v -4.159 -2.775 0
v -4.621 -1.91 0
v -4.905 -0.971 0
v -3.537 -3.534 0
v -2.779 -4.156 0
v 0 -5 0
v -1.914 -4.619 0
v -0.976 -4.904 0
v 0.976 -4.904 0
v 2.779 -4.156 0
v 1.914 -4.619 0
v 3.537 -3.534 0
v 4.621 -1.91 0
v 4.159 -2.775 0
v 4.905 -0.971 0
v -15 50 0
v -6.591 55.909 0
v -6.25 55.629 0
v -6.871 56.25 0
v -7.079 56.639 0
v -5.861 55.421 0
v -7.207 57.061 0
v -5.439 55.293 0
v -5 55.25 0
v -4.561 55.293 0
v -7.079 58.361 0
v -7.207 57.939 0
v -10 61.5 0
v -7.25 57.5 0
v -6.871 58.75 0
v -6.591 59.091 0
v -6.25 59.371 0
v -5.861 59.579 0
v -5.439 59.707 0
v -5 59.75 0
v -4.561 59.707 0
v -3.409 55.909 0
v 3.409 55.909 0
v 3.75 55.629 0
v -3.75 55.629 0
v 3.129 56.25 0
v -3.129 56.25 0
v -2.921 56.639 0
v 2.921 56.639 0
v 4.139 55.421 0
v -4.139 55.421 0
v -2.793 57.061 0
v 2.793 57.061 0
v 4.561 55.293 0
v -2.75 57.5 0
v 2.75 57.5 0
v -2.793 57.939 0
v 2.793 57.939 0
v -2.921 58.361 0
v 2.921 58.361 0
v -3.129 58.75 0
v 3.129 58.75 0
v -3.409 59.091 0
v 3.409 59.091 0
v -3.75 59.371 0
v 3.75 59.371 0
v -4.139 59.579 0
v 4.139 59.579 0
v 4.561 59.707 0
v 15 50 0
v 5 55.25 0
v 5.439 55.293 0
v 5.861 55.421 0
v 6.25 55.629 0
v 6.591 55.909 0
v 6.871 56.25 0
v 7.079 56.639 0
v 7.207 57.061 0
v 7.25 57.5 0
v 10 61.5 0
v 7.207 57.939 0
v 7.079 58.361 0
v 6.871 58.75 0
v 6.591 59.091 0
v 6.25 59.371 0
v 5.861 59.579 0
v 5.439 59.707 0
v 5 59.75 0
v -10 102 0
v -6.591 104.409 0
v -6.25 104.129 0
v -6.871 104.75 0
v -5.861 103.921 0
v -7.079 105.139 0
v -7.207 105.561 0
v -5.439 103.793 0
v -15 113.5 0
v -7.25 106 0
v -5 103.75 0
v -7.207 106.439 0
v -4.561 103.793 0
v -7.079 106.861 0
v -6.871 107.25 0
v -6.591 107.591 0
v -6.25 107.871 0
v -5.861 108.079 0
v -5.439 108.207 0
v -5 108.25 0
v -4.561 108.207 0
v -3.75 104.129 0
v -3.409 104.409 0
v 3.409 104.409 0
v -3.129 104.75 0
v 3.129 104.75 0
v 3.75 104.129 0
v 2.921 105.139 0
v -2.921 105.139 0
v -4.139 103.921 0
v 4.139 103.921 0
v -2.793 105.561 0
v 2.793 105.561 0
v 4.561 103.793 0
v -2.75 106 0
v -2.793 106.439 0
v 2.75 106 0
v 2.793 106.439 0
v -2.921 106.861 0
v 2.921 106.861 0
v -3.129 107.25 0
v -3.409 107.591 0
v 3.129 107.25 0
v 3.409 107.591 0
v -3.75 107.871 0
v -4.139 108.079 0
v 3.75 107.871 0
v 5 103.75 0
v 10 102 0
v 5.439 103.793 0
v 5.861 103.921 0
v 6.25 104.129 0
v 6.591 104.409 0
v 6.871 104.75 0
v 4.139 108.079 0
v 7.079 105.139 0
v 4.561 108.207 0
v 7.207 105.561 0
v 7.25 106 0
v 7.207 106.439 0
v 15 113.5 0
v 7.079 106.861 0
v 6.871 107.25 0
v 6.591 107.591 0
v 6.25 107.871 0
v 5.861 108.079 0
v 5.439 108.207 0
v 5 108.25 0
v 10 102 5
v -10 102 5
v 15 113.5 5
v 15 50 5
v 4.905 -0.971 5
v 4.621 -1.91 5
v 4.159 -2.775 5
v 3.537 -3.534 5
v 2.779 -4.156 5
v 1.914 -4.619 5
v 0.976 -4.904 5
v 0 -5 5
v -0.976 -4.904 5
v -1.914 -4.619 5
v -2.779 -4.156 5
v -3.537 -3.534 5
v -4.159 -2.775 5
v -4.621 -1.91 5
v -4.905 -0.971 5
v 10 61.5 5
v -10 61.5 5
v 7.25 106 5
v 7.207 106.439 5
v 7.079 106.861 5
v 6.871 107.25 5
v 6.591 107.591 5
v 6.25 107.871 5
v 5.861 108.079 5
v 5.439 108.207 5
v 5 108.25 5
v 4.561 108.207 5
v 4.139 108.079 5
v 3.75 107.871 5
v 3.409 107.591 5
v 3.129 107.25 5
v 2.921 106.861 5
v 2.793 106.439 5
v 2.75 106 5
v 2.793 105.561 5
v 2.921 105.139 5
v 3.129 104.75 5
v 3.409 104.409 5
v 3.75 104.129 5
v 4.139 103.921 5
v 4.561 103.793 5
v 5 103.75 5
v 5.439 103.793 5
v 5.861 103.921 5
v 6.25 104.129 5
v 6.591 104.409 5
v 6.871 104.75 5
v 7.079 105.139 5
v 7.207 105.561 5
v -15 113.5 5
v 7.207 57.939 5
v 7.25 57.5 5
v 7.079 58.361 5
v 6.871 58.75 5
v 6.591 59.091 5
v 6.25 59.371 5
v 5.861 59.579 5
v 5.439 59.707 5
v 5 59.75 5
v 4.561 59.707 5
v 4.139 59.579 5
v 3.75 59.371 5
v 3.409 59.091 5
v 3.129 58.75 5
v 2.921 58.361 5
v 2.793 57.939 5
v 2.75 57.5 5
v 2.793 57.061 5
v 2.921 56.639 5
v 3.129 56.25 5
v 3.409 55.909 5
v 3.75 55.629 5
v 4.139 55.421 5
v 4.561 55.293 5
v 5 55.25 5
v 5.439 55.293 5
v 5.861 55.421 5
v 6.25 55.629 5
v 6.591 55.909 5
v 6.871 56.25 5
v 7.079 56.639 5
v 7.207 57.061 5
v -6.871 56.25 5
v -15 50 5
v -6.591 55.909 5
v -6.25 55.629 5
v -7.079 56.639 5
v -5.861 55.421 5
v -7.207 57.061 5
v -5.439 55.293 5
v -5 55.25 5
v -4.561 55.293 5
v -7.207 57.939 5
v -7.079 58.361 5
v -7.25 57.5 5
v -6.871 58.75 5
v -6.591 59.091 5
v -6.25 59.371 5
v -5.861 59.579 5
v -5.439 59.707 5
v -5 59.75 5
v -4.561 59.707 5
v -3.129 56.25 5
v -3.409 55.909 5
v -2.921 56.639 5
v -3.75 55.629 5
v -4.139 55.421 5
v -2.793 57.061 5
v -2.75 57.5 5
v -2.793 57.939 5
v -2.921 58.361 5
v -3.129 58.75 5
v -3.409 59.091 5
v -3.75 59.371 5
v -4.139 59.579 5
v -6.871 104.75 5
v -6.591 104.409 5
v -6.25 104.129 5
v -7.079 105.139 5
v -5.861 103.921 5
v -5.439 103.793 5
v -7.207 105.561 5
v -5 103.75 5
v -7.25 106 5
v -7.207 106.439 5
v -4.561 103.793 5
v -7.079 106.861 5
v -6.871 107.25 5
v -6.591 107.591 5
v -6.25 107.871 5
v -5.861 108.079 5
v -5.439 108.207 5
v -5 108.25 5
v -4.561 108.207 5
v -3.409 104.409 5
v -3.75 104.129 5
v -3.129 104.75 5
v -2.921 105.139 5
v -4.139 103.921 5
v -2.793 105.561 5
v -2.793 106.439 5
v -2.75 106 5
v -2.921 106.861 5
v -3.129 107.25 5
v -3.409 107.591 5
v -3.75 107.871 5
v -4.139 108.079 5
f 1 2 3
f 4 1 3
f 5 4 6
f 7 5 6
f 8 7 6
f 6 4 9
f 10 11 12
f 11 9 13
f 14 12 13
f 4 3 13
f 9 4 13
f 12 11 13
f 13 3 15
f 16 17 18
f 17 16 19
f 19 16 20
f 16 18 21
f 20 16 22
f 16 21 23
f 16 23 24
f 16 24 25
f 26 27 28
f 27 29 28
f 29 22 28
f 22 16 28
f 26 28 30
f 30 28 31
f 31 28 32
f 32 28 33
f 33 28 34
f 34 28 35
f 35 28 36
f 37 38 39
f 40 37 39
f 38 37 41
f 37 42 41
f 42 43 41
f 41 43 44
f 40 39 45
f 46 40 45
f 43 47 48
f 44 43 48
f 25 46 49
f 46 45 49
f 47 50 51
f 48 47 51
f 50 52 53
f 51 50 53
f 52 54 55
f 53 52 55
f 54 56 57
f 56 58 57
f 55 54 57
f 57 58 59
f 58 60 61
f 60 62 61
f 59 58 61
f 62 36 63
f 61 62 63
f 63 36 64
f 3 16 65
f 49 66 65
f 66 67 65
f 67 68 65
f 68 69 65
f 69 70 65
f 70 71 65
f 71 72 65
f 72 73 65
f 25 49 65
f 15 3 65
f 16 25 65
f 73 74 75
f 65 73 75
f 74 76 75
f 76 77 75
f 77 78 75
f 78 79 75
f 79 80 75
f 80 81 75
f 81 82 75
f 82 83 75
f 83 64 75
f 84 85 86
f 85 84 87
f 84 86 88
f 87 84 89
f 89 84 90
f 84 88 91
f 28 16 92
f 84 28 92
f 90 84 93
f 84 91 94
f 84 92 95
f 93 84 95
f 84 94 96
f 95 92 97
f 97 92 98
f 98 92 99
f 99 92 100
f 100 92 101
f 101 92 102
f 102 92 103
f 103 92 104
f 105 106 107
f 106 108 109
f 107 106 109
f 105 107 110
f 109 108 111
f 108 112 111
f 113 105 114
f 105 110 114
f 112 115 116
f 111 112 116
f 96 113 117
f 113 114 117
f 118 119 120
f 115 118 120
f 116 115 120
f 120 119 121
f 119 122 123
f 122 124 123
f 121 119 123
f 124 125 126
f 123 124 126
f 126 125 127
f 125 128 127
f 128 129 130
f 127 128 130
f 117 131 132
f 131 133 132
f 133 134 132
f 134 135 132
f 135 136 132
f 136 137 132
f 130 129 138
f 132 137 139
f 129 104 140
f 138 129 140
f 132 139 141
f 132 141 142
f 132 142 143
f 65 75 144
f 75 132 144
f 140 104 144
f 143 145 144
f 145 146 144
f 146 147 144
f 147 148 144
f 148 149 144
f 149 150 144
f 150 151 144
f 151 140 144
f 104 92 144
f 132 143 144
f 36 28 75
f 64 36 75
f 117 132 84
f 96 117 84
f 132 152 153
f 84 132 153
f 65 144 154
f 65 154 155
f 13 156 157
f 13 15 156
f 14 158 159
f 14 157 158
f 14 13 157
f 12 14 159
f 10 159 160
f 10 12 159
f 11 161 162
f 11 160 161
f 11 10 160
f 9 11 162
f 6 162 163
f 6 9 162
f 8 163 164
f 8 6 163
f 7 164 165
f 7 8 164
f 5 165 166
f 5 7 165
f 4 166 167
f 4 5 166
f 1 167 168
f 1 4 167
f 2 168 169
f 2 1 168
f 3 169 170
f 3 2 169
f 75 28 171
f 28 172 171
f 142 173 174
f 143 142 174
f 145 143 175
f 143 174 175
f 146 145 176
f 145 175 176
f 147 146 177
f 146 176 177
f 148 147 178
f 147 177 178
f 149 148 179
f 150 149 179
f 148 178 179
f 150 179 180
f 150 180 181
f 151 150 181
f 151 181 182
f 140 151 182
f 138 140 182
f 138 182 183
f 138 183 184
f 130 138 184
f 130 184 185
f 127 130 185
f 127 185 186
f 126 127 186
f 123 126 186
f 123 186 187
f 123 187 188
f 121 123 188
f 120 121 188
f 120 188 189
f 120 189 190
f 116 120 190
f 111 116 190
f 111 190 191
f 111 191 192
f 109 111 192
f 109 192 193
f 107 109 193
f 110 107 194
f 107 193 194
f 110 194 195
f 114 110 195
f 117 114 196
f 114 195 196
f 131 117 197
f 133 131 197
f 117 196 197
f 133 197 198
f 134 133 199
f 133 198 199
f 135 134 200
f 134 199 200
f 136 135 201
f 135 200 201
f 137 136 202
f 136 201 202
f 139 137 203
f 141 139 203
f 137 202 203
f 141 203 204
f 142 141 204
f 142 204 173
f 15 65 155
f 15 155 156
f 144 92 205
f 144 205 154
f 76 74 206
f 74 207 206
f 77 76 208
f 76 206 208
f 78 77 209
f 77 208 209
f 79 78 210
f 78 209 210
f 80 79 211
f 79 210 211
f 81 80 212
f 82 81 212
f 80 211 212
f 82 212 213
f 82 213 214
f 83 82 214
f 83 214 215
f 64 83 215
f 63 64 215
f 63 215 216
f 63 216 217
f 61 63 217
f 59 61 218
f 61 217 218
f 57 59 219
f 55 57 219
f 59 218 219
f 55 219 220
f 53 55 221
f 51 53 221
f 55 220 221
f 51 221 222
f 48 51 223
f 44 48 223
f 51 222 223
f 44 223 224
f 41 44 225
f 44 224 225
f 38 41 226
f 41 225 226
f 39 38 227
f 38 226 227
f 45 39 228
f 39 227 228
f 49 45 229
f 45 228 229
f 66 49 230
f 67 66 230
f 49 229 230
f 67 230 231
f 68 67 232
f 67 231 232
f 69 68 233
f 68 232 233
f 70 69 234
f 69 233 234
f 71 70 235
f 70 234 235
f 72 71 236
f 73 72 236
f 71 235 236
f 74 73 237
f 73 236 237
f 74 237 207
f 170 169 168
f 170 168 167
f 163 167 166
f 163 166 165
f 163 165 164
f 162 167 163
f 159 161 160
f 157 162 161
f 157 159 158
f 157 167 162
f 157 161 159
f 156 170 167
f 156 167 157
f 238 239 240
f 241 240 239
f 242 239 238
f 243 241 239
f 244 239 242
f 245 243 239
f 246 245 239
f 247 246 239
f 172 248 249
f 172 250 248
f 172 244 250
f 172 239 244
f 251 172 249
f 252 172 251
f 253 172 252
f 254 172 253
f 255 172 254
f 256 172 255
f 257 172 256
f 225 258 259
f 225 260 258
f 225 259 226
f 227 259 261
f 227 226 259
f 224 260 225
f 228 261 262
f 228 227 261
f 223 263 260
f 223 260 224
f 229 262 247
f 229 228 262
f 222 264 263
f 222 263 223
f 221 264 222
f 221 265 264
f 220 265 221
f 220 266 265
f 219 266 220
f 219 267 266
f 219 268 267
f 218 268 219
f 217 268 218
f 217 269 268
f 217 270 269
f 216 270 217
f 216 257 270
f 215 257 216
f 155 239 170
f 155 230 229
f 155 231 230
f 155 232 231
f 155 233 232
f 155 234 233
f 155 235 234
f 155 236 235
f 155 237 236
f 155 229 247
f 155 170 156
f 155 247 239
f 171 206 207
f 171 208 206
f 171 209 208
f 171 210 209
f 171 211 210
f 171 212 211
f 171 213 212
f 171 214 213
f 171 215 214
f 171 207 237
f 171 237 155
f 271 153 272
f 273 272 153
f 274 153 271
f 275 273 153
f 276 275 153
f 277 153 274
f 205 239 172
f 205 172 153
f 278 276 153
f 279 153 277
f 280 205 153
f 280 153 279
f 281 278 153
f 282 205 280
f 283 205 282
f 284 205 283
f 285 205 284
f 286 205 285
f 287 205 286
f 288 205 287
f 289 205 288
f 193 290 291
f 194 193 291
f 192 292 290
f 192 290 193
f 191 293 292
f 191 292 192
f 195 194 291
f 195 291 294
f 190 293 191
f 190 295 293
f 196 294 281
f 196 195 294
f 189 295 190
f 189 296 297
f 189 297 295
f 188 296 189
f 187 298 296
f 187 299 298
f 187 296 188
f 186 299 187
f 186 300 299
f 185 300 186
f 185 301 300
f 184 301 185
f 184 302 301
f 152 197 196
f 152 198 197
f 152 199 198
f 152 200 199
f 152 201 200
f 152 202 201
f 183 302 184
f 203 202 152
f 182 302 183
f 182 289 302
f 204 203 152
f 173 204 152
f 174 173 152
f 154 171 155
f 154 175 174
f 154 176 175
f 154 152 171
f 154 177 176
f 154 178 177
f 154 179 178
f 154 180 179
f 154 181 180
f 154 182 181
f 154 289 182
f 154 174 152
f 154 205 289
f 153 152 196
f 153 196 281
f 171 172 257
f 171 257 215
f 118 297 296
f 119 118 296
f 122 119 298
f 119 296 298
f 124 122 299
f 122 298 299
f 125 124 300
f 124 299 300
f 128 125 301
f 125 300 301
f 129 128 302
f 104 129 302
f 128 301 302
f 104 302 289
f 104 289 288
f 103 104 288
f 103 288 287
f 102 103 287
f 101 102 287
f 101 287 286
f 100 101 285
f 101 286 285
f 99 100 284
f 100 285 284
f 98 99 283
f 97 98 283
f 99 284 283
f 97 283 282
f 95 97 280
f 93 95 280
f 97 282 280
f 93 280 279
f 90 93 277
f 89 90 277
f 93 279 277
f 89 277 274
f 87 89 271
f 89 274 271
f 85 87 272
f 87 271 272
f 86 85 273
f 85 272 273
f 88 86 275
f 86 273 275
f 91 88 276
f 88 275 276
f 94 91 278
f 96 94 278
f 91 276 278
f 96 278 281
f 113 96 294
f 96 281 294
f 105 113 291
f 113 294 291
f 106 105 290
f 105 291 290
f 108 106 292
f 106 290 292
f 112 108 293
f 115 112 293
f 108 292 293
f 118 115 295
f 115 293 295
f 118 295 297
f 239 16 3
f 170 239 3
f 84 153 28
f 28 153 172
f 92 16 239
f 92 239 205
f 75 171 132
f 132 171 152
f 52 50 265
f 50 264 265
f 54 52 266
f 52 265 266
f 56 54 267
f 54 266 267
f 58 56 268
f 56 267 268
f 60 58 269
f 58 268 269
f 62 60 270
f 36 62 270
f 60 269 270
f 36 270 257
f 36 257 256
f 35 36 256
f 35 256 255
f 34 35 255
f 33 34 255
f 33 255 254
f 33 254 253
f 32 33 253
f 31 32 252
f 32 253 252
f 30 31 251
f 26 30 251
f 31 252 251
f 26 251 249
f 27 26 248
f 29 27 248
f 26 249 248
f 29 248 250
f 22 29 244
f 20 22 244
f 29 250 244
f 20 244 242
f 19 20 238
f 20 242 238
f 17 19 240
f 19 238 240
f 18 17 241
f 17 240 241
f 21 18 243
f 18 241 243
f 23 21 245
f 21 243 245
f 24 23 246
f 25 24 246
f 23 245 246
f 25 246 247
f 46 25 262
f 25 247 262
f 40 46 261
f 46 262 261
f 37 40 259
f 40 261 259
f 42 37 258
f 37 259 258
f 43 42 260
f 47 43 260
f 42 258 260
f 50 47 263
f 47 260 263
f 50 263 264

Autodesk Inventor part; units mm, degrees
ref_plane "YZ Plane" through (0, 0, 0) normal (1, 0, 0) x (0, 1, 0)
ref_plane "XZ Plane" through (0, 0, 0) normal (0, 1, 0) x (-1, 0, 0)
ref_plane "XY Plane" through (0, 0, 0) normal (0, 0, 1) x (1, 0, 0)
sketch "Sketch1" plane through (0, 0, 0) normal (0, 0, 1) x (1, 0, 0)
  point P0 (0, 0)
sketch "Sketch2" plane through (0, 0, 0) normal (0, 0, 1) x (1, 0, 0)
  line L0 (-15, 113.5) -> (15, 113.5)
  line L1 (15, 113.5) -> (15, 50)
  line L2 (15, 50) -> (-15, 50) construction
  line L3 (-15, 50) -> (-15, 113.5)
  circle A0 centre (0, 0) radius 5 construction
  line L4 (-15, 50) -> (-4.9047, -0.9714)
  line L5 (15, 50) -> (4.9047, -0.9714)
  arc A1 (-4.9047, -0.9714) -> (4.9047, -0.9714) centre (0, 0) ccw
  point P0 (0, 50)
  dimension "d0" = 30
  dimension "d1" = 63.5
  dimension "d2" = 10
  dimension "d3" = 50
extrude "Extrusion1" add sketch "Sketch2" along normal blind 5
sketch "Sketch3" plane through (0, 0, 5) normal (0, 0, 1) x (1, 0, 0)
  line L0 (-10, 108.5) -> (10, 108.5) construction
  line L1 (10, 108.5) -> (10, 55) construction
  line L2 (10, 55) -> (-10, 55) construction
  line L3 (-10, 55) -> (-10, 108.5) construction
  line L4 (15, 113.5) -> (-15, 113.5) construction
  circle A0 centre (-5, 106) radius 2.25
  circle A1 centre (5, 106) radius 2.25
  circle A2 centre (-5, 57.5) radius 2.25
  circle A3 centre (5, 57.5) radius 2.25
  line L5 (-10, 61.5) -> (10, 61.5)
  line L6 (10, 61.5) -> (10, 102)
  line L7 (10, 102) -> (-10, 102)
  line L8 (-10, 102) -> (-10, 61.5)
  line L9 (0, 108.5) -> (0, 55) construction
  point P0 (0, 0)
  point P1 (-10, 81.75)
  point P2 (10, 81.75)
  point P3 (0, 81.75)
  dimension "d6" = 20
  dimension "d7" = 53.5
  dimension "d8" = 5
  dimension "d9" = 4.5
  dimension "d11" = 2.75
  dimension "d12" = 2.5
  dimension "d13" = 2.75
  dimension "d14" = 2.5
  dimension "d15" = 40.5
extrude "Extrusion2" cut sketch "Sketch3" against normal up to next
equation "\"d0\" = s_depth + 2 * b_mat_thickness"
equation "\"d1\" = 2 * s_land + s_width + 2 * b_mat_thickness"
equation "\"d4\" = b_mat_thickness"
equation "\"d6\" = s_depth"
equation "\"d7\" = s_width + 2 * s_land"
equation "\"d8\" = b_mat_thickness"
equation "\"d9\" = s_hole_dia"
equation "\"d11\" = s_hole_side_dist"
equation "\"d12\" = s_hole_front_dist"
equation "\"d13\" = s_hole_side_dist"
equation "\"d14\" = s_hole_front_dist"
equation "\"d15\" = s_width"
equation "\"d16\" = b_mat_thickness"
equation "\"s_depth\" = 20"
equation "\"b_mat_thickness\" = 5"
equation "\"s_land\" = 6.5"
equation "\"s_width\" = 40.5"
equation "\"s_hole_dia\" = 4.5"
equation "\"s_hole_side_dist\" = 2.75"
equation "\"s_hole_front_dist\" = 2.5"
properties part number "Lower_leg"
